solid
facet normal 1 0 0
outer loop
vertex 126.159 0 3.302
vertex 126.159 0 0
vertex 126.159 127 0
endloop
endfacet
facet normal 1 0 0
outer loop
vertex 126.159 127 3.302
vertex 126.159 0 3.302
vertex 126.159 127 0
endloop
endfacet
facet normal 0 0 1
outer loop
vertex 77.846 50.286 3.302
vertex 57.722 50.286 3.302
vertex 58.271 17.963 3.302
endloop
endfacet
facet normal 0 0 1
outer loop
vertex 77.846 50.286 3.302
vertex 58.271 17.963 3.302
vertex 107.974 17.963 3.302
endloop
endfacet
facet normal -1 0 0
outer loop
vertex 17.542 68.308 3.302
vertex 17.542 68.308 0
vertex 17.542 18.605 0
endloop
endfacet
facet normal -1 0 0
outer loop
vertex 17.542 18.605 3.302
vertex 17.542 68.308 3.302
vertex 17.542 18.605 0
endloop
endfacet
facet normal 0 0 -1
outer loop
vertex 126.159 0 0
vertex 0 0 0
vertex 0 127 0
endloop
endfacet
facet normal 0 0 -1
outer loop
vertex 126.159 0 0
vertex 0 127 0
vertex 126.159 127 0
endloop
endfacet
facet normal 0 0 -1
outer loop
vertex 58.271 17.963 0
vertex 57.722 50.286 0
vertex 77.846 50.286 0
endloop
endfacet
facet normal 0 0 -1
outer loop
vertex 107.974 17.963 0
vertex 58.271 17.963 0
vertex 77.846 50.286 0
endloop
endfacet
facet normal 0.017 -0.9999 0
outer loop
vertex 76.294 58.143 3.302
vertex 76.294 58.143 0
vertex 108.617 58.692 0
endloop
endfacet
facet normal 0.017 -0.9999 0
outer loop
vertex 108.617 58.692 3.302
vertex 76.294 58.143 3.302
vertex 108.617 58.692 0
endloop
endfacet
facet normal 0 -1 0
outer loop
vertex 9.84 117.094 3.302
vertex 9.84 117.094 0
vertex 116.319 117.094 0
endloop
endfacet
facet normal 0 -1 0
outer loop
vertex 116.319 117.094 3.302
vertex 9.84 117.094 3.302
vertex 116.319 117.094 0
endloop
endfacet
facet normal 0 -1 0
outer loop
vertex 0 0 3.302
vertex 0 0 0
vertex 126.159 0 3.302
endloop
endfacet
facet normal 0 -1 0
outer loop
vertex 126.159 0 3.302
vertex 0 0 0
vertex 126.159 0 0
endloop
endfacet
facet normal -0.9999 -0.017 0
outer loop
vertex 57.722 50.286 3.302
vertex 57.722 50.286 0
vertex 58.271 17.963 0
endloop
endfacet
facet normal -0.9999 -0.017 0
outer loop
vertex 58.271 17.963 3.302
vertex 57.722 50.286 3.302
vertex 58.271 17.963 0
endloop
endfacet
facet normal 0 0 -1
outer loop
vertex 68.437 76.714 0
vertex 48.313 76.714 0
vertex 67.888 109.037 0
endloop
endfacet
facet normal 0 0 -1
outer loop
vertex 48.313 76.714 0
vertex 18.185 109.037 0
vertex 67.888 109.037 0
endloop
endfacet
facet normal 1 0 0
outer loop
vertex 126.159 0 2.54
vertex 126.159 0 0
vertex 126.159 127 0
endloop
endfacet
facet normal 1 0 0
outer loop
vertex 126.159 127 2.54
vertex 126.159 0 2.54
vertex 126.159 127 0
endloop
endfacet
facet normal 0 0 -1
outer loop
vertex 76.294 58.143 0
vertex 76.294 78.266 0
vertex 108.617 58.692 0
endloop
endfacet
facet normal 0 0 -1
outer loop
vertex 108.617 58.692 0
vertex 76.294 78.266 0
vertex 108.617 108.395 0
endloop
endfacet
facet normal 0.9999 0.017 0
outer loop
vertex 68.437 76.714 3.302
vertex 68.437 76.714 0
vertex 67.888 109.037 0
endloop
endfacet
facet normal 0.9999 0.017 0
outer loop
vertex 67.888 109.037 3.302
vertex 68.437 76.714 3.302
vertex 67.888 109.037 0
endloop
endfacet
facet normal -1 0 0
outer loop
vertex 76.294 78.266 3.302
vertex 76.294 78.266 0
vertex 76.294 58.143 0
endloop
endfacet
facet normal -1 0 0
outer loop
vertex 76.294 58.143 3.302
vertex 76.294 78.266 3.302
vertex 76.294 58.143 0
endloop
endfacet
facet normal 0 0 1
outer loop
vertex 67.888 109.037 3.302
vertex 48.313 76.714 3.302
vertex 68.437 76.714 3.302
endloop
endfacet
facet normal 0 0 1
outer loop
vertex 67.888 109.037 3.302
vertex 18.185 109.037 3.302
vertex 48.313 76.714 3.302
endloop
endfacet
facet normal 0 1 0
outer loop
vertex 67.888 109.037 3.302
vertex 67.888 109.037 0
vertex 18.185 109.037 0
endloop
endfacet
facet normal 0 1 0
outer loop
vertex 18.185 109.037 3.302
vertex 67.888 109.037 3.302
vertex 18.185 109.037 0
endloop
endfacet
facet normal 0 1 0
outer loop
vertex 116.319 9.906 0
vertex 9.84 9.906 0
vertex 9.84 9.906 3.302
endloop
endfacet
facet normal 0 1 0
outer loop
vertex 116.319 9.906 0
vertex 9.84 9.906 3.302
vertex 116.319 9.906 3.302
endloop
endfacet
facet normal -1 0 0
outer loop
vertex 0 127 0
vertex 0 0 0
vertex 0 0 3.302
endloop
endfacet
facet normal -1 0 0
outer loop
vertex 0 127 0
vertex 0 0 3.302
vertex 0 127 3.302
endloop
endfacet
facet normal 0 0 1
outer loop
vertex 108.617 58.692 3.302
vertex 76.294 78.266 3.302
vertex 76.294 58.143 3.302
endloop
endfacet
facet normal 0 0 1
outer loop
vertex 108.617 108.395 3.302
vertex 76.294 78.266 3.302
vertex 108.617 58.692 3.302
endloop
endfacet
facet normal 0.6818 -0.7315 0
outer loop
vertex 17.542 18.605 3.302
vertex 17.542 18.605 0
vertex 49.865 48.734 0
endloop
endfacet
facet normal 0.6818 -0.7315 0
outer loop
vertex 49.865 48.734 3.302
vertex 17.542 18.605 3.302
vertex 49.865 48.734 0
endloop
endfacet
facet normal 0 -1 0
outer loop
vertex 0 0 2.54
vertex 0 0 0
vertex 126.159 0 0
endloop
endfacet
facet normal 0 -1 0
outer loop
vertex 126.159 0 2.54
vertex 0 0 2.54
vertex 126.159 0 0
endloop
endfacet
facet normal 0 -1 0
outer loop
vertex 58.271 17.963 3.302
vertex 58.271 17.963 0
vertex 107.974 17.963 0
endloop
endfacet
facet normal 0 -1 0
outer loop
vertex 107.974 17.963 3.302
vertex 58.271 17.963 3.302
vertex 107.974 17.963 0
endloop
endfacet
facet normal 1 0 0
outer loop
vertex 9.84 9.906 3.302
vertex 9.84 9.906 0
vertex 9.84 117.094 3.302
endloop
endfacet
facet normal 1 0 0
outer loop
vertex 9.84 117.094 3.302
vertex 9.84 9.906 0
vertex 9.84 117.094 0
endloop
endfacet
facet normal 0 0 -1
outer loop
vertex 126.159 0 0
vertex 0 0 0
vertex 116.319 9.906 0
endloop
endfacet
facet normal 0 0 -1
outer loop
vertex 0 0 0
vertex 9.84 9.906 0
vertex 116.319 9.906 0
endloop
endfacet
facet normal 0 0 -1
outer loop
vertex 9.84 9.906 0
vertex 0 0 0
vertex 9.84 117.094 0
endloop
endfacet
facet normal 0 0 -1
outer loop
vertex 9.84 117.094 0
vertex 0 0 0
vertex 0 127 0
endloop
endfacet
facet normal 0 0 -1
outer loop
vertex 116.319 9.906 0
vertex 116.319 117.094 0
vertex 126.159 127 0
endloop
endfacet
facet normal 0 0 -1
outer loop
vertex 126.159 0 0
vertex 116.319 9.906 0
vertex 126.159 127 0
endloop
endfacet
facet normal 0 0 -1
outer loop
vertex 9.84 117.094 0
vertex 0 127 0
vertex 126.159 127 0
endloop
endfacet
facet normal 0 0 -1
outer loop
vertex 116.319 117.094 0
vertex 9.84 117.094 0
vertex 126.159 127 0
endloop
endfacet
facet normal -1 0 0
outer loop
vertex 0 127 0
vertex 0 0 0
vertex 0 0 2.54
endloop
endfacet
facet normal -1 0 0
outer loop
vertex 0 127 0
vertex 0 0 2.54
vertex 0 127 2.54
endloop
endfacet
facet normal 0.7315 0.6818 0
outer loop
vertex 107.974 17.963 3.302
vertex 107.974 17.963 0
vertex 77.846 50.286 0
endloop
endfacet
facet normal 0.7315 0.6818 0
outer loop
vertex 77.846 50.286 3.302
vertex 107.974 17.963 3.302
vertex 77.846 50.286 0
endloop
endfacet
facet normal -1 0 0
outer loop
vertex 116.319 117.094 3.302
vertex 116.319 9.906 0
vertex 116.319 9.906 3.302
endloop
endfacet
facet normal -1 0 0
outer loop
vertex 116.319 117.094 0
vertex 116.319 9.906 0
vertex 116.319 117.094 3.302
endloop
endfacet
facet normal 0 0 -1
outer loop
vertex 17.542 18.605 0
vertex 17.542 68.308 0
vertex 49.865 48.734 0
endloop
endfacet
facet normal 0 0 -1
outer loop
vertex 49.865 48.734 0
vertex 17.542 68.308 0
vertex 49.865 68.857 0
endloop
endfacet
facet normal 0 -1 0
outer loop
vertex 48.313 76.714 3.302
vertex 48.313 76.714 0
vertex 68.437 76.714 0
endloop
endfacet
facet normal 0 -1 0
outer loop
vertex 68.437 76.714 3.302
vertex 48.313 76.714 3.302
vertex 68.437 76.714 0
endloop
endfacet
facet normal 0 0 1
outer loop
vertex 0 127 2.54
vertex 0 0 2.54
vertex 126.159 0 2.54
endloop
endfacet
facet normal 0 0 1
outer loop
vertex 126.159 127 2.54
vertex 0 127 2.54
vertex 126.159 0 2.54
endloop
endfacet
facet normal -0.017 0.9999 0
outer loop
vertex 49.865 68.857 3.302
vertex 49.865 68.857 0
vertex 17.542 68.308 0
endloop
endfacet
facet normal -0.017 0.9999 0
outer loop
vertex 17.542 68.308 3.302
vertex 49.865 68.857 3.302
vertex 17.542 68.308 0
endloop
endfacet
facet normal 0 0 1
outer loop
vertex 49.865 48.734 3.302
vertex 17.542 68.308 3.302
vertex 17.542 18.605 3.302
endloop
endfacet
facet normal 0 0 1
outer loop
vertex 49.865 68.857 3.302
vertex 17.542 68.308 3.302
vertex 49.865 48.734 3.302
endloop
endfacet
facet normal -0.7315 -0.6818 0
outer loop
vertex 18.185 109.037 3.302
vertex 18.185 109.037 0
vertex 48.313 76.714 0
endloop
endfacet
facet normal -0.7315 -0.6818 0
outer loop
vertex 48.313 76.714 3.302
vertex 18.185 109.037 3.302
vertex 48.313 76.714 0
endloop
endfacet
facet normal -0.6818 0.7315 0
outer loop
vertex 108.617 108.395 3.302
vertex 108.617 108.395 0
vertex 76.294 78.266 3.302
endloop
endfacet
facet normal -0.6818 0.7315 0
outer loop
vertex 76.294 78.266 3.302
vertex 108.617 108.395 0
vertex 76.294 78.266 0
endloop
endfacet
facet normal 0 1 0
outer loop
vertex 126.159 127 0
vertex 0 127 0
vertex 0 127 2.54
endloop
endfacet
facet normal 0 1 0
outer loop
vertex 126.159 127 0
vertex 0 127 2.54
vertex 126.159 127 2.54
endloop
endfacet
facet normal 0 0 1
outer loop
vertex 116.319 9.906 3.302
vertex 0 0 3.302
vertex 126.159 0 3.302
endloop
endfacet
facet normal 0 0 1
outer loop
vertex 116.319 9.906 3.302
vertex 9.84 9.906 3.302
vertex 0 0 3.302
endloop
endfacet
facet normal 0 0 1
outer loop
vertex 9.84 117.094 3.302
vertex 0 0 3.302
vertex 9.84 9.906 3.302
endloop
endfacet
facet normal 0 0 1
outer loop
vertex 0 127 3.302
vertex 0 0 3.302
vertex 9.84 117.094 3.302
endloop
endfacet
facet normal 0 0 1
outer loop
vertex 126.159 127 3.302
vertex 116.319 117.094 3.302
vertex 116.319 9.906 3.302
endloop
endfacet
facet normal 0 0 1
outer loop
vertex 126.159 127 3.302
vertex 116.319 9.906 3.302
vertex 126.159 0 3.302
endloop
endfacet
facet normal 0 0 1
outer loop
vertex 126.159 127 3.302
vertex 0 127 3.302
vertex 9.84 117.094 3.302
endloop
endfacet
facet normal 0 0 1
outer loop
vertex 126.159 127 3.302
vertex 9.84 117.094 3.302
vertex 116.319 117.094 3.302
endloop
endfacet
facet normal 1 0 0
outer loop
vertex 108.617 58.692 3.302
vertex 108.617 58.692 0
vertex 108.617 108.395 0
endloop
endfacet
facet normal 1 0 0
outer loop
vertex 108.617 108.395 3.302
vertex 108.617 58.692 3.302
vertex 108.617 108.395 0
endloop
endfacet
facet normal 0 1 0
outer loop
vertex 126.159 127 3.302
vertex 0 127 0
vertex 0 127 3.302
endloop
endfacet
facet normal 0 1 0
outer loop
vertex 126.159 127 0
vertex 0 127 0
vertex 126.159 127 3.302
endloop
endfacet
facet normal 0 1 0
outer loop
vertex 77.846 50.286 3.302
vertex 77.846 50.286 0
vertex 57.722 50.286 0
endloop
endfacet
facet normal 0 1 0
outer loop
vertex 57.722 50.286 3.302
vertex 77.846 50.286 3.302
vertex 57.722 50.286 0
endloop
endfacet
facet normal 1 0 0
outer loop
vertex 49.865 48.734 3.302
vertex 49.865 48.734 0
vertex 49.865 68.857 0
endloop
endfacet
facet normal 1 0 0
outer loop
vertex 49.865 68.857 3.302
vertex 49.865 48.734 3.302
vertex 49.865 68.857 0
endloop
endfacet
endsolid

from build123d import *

# Parameters (mm, degrees)
F1_DEPTH = 3.302
F0_W     = 126.1589403974
F0_H     = 127
F0_W_2   = 106.4781456954
F0_H_2   = 107.188
F2_W     = 126.1589403974
F2_H     = 127
F3_DEPTH = 2.54


with BuildPart() as f1:
    # F0 (on Top) → F1 (new body)
    with BuildSketch(Plane.XY):
        Polygon((48.3132749796, 76.7144486308), (68.4366269667, 76.7144486308), (67.8877709749, 109.0374365449), (18.1845979622, 109.0374365449), align=None)
    extrude(amount=F1_DEPTH)


with BuildPart() as f1b:
    # F0 (on Top) → F1, piece 2 (new body)
    with BuildSketch(Plane.XY):
        Polygon((108.6169067436, 58.6916992238), (108.6169067436, 108.3948722365), (76.2939188295, 78.2661952191), (76.2939188295, 58.142843232), align=None)
    extrude(amount=F1_DEPTH)


with BuildPart() as f1c:
    # F0 (on Top) → F1, piece 3 (new body)
    with BuildSketch(Plane.XY):
        Polygon((57.7223134307, 50.2855513692), (58.2711694225, 17.9625634551), (107.9743424352, 17.9625634551), (77.8456654178, 50.2855513692), align=None)
    extrude(amount=F1_DEPTH)


with BuildPart() as f1d:
    # F0 (on Top) → F1, piece 4 (new body)
    with BuildSketch(Plane.XY):
        Polygon((49.8650215679, 68.857156768), (17.5420336538, 68.3083007762), (17.5420336538, 18.6051277635), (49.8650215679, 48.7338047809), align=None)
    extrude(amount=F1_DEPTH)


with BuildPart() as f1e:
    # F0 (on Top) → F1, piece 5 (new body)
    with BuildSketch(Plane.XY):
        with Locations((63.0794701987, 63.5)):
            Rectangle(F0_W, F0_H)
        with Locations((63.0794701987, 63.5)):
            Rectangle(F0_W_2, F0_H_2, mode=Mode.SUBTRACT)
    extrude(amount=F1_DEPTH)


with BuildPart() as f3:
    # F2 (on Top) → F3 (new body)
    with BuildSketch(Plane.XY):
        with Locations((63.0794701987, 63.5)):
            Rectangle(F2_W, F2_H)
    extrude(amount=F3_DEPTH)


solid = Compound([f1.part, f1b.part, f1c.part, f1d.part, f1e.part, f3.part])
